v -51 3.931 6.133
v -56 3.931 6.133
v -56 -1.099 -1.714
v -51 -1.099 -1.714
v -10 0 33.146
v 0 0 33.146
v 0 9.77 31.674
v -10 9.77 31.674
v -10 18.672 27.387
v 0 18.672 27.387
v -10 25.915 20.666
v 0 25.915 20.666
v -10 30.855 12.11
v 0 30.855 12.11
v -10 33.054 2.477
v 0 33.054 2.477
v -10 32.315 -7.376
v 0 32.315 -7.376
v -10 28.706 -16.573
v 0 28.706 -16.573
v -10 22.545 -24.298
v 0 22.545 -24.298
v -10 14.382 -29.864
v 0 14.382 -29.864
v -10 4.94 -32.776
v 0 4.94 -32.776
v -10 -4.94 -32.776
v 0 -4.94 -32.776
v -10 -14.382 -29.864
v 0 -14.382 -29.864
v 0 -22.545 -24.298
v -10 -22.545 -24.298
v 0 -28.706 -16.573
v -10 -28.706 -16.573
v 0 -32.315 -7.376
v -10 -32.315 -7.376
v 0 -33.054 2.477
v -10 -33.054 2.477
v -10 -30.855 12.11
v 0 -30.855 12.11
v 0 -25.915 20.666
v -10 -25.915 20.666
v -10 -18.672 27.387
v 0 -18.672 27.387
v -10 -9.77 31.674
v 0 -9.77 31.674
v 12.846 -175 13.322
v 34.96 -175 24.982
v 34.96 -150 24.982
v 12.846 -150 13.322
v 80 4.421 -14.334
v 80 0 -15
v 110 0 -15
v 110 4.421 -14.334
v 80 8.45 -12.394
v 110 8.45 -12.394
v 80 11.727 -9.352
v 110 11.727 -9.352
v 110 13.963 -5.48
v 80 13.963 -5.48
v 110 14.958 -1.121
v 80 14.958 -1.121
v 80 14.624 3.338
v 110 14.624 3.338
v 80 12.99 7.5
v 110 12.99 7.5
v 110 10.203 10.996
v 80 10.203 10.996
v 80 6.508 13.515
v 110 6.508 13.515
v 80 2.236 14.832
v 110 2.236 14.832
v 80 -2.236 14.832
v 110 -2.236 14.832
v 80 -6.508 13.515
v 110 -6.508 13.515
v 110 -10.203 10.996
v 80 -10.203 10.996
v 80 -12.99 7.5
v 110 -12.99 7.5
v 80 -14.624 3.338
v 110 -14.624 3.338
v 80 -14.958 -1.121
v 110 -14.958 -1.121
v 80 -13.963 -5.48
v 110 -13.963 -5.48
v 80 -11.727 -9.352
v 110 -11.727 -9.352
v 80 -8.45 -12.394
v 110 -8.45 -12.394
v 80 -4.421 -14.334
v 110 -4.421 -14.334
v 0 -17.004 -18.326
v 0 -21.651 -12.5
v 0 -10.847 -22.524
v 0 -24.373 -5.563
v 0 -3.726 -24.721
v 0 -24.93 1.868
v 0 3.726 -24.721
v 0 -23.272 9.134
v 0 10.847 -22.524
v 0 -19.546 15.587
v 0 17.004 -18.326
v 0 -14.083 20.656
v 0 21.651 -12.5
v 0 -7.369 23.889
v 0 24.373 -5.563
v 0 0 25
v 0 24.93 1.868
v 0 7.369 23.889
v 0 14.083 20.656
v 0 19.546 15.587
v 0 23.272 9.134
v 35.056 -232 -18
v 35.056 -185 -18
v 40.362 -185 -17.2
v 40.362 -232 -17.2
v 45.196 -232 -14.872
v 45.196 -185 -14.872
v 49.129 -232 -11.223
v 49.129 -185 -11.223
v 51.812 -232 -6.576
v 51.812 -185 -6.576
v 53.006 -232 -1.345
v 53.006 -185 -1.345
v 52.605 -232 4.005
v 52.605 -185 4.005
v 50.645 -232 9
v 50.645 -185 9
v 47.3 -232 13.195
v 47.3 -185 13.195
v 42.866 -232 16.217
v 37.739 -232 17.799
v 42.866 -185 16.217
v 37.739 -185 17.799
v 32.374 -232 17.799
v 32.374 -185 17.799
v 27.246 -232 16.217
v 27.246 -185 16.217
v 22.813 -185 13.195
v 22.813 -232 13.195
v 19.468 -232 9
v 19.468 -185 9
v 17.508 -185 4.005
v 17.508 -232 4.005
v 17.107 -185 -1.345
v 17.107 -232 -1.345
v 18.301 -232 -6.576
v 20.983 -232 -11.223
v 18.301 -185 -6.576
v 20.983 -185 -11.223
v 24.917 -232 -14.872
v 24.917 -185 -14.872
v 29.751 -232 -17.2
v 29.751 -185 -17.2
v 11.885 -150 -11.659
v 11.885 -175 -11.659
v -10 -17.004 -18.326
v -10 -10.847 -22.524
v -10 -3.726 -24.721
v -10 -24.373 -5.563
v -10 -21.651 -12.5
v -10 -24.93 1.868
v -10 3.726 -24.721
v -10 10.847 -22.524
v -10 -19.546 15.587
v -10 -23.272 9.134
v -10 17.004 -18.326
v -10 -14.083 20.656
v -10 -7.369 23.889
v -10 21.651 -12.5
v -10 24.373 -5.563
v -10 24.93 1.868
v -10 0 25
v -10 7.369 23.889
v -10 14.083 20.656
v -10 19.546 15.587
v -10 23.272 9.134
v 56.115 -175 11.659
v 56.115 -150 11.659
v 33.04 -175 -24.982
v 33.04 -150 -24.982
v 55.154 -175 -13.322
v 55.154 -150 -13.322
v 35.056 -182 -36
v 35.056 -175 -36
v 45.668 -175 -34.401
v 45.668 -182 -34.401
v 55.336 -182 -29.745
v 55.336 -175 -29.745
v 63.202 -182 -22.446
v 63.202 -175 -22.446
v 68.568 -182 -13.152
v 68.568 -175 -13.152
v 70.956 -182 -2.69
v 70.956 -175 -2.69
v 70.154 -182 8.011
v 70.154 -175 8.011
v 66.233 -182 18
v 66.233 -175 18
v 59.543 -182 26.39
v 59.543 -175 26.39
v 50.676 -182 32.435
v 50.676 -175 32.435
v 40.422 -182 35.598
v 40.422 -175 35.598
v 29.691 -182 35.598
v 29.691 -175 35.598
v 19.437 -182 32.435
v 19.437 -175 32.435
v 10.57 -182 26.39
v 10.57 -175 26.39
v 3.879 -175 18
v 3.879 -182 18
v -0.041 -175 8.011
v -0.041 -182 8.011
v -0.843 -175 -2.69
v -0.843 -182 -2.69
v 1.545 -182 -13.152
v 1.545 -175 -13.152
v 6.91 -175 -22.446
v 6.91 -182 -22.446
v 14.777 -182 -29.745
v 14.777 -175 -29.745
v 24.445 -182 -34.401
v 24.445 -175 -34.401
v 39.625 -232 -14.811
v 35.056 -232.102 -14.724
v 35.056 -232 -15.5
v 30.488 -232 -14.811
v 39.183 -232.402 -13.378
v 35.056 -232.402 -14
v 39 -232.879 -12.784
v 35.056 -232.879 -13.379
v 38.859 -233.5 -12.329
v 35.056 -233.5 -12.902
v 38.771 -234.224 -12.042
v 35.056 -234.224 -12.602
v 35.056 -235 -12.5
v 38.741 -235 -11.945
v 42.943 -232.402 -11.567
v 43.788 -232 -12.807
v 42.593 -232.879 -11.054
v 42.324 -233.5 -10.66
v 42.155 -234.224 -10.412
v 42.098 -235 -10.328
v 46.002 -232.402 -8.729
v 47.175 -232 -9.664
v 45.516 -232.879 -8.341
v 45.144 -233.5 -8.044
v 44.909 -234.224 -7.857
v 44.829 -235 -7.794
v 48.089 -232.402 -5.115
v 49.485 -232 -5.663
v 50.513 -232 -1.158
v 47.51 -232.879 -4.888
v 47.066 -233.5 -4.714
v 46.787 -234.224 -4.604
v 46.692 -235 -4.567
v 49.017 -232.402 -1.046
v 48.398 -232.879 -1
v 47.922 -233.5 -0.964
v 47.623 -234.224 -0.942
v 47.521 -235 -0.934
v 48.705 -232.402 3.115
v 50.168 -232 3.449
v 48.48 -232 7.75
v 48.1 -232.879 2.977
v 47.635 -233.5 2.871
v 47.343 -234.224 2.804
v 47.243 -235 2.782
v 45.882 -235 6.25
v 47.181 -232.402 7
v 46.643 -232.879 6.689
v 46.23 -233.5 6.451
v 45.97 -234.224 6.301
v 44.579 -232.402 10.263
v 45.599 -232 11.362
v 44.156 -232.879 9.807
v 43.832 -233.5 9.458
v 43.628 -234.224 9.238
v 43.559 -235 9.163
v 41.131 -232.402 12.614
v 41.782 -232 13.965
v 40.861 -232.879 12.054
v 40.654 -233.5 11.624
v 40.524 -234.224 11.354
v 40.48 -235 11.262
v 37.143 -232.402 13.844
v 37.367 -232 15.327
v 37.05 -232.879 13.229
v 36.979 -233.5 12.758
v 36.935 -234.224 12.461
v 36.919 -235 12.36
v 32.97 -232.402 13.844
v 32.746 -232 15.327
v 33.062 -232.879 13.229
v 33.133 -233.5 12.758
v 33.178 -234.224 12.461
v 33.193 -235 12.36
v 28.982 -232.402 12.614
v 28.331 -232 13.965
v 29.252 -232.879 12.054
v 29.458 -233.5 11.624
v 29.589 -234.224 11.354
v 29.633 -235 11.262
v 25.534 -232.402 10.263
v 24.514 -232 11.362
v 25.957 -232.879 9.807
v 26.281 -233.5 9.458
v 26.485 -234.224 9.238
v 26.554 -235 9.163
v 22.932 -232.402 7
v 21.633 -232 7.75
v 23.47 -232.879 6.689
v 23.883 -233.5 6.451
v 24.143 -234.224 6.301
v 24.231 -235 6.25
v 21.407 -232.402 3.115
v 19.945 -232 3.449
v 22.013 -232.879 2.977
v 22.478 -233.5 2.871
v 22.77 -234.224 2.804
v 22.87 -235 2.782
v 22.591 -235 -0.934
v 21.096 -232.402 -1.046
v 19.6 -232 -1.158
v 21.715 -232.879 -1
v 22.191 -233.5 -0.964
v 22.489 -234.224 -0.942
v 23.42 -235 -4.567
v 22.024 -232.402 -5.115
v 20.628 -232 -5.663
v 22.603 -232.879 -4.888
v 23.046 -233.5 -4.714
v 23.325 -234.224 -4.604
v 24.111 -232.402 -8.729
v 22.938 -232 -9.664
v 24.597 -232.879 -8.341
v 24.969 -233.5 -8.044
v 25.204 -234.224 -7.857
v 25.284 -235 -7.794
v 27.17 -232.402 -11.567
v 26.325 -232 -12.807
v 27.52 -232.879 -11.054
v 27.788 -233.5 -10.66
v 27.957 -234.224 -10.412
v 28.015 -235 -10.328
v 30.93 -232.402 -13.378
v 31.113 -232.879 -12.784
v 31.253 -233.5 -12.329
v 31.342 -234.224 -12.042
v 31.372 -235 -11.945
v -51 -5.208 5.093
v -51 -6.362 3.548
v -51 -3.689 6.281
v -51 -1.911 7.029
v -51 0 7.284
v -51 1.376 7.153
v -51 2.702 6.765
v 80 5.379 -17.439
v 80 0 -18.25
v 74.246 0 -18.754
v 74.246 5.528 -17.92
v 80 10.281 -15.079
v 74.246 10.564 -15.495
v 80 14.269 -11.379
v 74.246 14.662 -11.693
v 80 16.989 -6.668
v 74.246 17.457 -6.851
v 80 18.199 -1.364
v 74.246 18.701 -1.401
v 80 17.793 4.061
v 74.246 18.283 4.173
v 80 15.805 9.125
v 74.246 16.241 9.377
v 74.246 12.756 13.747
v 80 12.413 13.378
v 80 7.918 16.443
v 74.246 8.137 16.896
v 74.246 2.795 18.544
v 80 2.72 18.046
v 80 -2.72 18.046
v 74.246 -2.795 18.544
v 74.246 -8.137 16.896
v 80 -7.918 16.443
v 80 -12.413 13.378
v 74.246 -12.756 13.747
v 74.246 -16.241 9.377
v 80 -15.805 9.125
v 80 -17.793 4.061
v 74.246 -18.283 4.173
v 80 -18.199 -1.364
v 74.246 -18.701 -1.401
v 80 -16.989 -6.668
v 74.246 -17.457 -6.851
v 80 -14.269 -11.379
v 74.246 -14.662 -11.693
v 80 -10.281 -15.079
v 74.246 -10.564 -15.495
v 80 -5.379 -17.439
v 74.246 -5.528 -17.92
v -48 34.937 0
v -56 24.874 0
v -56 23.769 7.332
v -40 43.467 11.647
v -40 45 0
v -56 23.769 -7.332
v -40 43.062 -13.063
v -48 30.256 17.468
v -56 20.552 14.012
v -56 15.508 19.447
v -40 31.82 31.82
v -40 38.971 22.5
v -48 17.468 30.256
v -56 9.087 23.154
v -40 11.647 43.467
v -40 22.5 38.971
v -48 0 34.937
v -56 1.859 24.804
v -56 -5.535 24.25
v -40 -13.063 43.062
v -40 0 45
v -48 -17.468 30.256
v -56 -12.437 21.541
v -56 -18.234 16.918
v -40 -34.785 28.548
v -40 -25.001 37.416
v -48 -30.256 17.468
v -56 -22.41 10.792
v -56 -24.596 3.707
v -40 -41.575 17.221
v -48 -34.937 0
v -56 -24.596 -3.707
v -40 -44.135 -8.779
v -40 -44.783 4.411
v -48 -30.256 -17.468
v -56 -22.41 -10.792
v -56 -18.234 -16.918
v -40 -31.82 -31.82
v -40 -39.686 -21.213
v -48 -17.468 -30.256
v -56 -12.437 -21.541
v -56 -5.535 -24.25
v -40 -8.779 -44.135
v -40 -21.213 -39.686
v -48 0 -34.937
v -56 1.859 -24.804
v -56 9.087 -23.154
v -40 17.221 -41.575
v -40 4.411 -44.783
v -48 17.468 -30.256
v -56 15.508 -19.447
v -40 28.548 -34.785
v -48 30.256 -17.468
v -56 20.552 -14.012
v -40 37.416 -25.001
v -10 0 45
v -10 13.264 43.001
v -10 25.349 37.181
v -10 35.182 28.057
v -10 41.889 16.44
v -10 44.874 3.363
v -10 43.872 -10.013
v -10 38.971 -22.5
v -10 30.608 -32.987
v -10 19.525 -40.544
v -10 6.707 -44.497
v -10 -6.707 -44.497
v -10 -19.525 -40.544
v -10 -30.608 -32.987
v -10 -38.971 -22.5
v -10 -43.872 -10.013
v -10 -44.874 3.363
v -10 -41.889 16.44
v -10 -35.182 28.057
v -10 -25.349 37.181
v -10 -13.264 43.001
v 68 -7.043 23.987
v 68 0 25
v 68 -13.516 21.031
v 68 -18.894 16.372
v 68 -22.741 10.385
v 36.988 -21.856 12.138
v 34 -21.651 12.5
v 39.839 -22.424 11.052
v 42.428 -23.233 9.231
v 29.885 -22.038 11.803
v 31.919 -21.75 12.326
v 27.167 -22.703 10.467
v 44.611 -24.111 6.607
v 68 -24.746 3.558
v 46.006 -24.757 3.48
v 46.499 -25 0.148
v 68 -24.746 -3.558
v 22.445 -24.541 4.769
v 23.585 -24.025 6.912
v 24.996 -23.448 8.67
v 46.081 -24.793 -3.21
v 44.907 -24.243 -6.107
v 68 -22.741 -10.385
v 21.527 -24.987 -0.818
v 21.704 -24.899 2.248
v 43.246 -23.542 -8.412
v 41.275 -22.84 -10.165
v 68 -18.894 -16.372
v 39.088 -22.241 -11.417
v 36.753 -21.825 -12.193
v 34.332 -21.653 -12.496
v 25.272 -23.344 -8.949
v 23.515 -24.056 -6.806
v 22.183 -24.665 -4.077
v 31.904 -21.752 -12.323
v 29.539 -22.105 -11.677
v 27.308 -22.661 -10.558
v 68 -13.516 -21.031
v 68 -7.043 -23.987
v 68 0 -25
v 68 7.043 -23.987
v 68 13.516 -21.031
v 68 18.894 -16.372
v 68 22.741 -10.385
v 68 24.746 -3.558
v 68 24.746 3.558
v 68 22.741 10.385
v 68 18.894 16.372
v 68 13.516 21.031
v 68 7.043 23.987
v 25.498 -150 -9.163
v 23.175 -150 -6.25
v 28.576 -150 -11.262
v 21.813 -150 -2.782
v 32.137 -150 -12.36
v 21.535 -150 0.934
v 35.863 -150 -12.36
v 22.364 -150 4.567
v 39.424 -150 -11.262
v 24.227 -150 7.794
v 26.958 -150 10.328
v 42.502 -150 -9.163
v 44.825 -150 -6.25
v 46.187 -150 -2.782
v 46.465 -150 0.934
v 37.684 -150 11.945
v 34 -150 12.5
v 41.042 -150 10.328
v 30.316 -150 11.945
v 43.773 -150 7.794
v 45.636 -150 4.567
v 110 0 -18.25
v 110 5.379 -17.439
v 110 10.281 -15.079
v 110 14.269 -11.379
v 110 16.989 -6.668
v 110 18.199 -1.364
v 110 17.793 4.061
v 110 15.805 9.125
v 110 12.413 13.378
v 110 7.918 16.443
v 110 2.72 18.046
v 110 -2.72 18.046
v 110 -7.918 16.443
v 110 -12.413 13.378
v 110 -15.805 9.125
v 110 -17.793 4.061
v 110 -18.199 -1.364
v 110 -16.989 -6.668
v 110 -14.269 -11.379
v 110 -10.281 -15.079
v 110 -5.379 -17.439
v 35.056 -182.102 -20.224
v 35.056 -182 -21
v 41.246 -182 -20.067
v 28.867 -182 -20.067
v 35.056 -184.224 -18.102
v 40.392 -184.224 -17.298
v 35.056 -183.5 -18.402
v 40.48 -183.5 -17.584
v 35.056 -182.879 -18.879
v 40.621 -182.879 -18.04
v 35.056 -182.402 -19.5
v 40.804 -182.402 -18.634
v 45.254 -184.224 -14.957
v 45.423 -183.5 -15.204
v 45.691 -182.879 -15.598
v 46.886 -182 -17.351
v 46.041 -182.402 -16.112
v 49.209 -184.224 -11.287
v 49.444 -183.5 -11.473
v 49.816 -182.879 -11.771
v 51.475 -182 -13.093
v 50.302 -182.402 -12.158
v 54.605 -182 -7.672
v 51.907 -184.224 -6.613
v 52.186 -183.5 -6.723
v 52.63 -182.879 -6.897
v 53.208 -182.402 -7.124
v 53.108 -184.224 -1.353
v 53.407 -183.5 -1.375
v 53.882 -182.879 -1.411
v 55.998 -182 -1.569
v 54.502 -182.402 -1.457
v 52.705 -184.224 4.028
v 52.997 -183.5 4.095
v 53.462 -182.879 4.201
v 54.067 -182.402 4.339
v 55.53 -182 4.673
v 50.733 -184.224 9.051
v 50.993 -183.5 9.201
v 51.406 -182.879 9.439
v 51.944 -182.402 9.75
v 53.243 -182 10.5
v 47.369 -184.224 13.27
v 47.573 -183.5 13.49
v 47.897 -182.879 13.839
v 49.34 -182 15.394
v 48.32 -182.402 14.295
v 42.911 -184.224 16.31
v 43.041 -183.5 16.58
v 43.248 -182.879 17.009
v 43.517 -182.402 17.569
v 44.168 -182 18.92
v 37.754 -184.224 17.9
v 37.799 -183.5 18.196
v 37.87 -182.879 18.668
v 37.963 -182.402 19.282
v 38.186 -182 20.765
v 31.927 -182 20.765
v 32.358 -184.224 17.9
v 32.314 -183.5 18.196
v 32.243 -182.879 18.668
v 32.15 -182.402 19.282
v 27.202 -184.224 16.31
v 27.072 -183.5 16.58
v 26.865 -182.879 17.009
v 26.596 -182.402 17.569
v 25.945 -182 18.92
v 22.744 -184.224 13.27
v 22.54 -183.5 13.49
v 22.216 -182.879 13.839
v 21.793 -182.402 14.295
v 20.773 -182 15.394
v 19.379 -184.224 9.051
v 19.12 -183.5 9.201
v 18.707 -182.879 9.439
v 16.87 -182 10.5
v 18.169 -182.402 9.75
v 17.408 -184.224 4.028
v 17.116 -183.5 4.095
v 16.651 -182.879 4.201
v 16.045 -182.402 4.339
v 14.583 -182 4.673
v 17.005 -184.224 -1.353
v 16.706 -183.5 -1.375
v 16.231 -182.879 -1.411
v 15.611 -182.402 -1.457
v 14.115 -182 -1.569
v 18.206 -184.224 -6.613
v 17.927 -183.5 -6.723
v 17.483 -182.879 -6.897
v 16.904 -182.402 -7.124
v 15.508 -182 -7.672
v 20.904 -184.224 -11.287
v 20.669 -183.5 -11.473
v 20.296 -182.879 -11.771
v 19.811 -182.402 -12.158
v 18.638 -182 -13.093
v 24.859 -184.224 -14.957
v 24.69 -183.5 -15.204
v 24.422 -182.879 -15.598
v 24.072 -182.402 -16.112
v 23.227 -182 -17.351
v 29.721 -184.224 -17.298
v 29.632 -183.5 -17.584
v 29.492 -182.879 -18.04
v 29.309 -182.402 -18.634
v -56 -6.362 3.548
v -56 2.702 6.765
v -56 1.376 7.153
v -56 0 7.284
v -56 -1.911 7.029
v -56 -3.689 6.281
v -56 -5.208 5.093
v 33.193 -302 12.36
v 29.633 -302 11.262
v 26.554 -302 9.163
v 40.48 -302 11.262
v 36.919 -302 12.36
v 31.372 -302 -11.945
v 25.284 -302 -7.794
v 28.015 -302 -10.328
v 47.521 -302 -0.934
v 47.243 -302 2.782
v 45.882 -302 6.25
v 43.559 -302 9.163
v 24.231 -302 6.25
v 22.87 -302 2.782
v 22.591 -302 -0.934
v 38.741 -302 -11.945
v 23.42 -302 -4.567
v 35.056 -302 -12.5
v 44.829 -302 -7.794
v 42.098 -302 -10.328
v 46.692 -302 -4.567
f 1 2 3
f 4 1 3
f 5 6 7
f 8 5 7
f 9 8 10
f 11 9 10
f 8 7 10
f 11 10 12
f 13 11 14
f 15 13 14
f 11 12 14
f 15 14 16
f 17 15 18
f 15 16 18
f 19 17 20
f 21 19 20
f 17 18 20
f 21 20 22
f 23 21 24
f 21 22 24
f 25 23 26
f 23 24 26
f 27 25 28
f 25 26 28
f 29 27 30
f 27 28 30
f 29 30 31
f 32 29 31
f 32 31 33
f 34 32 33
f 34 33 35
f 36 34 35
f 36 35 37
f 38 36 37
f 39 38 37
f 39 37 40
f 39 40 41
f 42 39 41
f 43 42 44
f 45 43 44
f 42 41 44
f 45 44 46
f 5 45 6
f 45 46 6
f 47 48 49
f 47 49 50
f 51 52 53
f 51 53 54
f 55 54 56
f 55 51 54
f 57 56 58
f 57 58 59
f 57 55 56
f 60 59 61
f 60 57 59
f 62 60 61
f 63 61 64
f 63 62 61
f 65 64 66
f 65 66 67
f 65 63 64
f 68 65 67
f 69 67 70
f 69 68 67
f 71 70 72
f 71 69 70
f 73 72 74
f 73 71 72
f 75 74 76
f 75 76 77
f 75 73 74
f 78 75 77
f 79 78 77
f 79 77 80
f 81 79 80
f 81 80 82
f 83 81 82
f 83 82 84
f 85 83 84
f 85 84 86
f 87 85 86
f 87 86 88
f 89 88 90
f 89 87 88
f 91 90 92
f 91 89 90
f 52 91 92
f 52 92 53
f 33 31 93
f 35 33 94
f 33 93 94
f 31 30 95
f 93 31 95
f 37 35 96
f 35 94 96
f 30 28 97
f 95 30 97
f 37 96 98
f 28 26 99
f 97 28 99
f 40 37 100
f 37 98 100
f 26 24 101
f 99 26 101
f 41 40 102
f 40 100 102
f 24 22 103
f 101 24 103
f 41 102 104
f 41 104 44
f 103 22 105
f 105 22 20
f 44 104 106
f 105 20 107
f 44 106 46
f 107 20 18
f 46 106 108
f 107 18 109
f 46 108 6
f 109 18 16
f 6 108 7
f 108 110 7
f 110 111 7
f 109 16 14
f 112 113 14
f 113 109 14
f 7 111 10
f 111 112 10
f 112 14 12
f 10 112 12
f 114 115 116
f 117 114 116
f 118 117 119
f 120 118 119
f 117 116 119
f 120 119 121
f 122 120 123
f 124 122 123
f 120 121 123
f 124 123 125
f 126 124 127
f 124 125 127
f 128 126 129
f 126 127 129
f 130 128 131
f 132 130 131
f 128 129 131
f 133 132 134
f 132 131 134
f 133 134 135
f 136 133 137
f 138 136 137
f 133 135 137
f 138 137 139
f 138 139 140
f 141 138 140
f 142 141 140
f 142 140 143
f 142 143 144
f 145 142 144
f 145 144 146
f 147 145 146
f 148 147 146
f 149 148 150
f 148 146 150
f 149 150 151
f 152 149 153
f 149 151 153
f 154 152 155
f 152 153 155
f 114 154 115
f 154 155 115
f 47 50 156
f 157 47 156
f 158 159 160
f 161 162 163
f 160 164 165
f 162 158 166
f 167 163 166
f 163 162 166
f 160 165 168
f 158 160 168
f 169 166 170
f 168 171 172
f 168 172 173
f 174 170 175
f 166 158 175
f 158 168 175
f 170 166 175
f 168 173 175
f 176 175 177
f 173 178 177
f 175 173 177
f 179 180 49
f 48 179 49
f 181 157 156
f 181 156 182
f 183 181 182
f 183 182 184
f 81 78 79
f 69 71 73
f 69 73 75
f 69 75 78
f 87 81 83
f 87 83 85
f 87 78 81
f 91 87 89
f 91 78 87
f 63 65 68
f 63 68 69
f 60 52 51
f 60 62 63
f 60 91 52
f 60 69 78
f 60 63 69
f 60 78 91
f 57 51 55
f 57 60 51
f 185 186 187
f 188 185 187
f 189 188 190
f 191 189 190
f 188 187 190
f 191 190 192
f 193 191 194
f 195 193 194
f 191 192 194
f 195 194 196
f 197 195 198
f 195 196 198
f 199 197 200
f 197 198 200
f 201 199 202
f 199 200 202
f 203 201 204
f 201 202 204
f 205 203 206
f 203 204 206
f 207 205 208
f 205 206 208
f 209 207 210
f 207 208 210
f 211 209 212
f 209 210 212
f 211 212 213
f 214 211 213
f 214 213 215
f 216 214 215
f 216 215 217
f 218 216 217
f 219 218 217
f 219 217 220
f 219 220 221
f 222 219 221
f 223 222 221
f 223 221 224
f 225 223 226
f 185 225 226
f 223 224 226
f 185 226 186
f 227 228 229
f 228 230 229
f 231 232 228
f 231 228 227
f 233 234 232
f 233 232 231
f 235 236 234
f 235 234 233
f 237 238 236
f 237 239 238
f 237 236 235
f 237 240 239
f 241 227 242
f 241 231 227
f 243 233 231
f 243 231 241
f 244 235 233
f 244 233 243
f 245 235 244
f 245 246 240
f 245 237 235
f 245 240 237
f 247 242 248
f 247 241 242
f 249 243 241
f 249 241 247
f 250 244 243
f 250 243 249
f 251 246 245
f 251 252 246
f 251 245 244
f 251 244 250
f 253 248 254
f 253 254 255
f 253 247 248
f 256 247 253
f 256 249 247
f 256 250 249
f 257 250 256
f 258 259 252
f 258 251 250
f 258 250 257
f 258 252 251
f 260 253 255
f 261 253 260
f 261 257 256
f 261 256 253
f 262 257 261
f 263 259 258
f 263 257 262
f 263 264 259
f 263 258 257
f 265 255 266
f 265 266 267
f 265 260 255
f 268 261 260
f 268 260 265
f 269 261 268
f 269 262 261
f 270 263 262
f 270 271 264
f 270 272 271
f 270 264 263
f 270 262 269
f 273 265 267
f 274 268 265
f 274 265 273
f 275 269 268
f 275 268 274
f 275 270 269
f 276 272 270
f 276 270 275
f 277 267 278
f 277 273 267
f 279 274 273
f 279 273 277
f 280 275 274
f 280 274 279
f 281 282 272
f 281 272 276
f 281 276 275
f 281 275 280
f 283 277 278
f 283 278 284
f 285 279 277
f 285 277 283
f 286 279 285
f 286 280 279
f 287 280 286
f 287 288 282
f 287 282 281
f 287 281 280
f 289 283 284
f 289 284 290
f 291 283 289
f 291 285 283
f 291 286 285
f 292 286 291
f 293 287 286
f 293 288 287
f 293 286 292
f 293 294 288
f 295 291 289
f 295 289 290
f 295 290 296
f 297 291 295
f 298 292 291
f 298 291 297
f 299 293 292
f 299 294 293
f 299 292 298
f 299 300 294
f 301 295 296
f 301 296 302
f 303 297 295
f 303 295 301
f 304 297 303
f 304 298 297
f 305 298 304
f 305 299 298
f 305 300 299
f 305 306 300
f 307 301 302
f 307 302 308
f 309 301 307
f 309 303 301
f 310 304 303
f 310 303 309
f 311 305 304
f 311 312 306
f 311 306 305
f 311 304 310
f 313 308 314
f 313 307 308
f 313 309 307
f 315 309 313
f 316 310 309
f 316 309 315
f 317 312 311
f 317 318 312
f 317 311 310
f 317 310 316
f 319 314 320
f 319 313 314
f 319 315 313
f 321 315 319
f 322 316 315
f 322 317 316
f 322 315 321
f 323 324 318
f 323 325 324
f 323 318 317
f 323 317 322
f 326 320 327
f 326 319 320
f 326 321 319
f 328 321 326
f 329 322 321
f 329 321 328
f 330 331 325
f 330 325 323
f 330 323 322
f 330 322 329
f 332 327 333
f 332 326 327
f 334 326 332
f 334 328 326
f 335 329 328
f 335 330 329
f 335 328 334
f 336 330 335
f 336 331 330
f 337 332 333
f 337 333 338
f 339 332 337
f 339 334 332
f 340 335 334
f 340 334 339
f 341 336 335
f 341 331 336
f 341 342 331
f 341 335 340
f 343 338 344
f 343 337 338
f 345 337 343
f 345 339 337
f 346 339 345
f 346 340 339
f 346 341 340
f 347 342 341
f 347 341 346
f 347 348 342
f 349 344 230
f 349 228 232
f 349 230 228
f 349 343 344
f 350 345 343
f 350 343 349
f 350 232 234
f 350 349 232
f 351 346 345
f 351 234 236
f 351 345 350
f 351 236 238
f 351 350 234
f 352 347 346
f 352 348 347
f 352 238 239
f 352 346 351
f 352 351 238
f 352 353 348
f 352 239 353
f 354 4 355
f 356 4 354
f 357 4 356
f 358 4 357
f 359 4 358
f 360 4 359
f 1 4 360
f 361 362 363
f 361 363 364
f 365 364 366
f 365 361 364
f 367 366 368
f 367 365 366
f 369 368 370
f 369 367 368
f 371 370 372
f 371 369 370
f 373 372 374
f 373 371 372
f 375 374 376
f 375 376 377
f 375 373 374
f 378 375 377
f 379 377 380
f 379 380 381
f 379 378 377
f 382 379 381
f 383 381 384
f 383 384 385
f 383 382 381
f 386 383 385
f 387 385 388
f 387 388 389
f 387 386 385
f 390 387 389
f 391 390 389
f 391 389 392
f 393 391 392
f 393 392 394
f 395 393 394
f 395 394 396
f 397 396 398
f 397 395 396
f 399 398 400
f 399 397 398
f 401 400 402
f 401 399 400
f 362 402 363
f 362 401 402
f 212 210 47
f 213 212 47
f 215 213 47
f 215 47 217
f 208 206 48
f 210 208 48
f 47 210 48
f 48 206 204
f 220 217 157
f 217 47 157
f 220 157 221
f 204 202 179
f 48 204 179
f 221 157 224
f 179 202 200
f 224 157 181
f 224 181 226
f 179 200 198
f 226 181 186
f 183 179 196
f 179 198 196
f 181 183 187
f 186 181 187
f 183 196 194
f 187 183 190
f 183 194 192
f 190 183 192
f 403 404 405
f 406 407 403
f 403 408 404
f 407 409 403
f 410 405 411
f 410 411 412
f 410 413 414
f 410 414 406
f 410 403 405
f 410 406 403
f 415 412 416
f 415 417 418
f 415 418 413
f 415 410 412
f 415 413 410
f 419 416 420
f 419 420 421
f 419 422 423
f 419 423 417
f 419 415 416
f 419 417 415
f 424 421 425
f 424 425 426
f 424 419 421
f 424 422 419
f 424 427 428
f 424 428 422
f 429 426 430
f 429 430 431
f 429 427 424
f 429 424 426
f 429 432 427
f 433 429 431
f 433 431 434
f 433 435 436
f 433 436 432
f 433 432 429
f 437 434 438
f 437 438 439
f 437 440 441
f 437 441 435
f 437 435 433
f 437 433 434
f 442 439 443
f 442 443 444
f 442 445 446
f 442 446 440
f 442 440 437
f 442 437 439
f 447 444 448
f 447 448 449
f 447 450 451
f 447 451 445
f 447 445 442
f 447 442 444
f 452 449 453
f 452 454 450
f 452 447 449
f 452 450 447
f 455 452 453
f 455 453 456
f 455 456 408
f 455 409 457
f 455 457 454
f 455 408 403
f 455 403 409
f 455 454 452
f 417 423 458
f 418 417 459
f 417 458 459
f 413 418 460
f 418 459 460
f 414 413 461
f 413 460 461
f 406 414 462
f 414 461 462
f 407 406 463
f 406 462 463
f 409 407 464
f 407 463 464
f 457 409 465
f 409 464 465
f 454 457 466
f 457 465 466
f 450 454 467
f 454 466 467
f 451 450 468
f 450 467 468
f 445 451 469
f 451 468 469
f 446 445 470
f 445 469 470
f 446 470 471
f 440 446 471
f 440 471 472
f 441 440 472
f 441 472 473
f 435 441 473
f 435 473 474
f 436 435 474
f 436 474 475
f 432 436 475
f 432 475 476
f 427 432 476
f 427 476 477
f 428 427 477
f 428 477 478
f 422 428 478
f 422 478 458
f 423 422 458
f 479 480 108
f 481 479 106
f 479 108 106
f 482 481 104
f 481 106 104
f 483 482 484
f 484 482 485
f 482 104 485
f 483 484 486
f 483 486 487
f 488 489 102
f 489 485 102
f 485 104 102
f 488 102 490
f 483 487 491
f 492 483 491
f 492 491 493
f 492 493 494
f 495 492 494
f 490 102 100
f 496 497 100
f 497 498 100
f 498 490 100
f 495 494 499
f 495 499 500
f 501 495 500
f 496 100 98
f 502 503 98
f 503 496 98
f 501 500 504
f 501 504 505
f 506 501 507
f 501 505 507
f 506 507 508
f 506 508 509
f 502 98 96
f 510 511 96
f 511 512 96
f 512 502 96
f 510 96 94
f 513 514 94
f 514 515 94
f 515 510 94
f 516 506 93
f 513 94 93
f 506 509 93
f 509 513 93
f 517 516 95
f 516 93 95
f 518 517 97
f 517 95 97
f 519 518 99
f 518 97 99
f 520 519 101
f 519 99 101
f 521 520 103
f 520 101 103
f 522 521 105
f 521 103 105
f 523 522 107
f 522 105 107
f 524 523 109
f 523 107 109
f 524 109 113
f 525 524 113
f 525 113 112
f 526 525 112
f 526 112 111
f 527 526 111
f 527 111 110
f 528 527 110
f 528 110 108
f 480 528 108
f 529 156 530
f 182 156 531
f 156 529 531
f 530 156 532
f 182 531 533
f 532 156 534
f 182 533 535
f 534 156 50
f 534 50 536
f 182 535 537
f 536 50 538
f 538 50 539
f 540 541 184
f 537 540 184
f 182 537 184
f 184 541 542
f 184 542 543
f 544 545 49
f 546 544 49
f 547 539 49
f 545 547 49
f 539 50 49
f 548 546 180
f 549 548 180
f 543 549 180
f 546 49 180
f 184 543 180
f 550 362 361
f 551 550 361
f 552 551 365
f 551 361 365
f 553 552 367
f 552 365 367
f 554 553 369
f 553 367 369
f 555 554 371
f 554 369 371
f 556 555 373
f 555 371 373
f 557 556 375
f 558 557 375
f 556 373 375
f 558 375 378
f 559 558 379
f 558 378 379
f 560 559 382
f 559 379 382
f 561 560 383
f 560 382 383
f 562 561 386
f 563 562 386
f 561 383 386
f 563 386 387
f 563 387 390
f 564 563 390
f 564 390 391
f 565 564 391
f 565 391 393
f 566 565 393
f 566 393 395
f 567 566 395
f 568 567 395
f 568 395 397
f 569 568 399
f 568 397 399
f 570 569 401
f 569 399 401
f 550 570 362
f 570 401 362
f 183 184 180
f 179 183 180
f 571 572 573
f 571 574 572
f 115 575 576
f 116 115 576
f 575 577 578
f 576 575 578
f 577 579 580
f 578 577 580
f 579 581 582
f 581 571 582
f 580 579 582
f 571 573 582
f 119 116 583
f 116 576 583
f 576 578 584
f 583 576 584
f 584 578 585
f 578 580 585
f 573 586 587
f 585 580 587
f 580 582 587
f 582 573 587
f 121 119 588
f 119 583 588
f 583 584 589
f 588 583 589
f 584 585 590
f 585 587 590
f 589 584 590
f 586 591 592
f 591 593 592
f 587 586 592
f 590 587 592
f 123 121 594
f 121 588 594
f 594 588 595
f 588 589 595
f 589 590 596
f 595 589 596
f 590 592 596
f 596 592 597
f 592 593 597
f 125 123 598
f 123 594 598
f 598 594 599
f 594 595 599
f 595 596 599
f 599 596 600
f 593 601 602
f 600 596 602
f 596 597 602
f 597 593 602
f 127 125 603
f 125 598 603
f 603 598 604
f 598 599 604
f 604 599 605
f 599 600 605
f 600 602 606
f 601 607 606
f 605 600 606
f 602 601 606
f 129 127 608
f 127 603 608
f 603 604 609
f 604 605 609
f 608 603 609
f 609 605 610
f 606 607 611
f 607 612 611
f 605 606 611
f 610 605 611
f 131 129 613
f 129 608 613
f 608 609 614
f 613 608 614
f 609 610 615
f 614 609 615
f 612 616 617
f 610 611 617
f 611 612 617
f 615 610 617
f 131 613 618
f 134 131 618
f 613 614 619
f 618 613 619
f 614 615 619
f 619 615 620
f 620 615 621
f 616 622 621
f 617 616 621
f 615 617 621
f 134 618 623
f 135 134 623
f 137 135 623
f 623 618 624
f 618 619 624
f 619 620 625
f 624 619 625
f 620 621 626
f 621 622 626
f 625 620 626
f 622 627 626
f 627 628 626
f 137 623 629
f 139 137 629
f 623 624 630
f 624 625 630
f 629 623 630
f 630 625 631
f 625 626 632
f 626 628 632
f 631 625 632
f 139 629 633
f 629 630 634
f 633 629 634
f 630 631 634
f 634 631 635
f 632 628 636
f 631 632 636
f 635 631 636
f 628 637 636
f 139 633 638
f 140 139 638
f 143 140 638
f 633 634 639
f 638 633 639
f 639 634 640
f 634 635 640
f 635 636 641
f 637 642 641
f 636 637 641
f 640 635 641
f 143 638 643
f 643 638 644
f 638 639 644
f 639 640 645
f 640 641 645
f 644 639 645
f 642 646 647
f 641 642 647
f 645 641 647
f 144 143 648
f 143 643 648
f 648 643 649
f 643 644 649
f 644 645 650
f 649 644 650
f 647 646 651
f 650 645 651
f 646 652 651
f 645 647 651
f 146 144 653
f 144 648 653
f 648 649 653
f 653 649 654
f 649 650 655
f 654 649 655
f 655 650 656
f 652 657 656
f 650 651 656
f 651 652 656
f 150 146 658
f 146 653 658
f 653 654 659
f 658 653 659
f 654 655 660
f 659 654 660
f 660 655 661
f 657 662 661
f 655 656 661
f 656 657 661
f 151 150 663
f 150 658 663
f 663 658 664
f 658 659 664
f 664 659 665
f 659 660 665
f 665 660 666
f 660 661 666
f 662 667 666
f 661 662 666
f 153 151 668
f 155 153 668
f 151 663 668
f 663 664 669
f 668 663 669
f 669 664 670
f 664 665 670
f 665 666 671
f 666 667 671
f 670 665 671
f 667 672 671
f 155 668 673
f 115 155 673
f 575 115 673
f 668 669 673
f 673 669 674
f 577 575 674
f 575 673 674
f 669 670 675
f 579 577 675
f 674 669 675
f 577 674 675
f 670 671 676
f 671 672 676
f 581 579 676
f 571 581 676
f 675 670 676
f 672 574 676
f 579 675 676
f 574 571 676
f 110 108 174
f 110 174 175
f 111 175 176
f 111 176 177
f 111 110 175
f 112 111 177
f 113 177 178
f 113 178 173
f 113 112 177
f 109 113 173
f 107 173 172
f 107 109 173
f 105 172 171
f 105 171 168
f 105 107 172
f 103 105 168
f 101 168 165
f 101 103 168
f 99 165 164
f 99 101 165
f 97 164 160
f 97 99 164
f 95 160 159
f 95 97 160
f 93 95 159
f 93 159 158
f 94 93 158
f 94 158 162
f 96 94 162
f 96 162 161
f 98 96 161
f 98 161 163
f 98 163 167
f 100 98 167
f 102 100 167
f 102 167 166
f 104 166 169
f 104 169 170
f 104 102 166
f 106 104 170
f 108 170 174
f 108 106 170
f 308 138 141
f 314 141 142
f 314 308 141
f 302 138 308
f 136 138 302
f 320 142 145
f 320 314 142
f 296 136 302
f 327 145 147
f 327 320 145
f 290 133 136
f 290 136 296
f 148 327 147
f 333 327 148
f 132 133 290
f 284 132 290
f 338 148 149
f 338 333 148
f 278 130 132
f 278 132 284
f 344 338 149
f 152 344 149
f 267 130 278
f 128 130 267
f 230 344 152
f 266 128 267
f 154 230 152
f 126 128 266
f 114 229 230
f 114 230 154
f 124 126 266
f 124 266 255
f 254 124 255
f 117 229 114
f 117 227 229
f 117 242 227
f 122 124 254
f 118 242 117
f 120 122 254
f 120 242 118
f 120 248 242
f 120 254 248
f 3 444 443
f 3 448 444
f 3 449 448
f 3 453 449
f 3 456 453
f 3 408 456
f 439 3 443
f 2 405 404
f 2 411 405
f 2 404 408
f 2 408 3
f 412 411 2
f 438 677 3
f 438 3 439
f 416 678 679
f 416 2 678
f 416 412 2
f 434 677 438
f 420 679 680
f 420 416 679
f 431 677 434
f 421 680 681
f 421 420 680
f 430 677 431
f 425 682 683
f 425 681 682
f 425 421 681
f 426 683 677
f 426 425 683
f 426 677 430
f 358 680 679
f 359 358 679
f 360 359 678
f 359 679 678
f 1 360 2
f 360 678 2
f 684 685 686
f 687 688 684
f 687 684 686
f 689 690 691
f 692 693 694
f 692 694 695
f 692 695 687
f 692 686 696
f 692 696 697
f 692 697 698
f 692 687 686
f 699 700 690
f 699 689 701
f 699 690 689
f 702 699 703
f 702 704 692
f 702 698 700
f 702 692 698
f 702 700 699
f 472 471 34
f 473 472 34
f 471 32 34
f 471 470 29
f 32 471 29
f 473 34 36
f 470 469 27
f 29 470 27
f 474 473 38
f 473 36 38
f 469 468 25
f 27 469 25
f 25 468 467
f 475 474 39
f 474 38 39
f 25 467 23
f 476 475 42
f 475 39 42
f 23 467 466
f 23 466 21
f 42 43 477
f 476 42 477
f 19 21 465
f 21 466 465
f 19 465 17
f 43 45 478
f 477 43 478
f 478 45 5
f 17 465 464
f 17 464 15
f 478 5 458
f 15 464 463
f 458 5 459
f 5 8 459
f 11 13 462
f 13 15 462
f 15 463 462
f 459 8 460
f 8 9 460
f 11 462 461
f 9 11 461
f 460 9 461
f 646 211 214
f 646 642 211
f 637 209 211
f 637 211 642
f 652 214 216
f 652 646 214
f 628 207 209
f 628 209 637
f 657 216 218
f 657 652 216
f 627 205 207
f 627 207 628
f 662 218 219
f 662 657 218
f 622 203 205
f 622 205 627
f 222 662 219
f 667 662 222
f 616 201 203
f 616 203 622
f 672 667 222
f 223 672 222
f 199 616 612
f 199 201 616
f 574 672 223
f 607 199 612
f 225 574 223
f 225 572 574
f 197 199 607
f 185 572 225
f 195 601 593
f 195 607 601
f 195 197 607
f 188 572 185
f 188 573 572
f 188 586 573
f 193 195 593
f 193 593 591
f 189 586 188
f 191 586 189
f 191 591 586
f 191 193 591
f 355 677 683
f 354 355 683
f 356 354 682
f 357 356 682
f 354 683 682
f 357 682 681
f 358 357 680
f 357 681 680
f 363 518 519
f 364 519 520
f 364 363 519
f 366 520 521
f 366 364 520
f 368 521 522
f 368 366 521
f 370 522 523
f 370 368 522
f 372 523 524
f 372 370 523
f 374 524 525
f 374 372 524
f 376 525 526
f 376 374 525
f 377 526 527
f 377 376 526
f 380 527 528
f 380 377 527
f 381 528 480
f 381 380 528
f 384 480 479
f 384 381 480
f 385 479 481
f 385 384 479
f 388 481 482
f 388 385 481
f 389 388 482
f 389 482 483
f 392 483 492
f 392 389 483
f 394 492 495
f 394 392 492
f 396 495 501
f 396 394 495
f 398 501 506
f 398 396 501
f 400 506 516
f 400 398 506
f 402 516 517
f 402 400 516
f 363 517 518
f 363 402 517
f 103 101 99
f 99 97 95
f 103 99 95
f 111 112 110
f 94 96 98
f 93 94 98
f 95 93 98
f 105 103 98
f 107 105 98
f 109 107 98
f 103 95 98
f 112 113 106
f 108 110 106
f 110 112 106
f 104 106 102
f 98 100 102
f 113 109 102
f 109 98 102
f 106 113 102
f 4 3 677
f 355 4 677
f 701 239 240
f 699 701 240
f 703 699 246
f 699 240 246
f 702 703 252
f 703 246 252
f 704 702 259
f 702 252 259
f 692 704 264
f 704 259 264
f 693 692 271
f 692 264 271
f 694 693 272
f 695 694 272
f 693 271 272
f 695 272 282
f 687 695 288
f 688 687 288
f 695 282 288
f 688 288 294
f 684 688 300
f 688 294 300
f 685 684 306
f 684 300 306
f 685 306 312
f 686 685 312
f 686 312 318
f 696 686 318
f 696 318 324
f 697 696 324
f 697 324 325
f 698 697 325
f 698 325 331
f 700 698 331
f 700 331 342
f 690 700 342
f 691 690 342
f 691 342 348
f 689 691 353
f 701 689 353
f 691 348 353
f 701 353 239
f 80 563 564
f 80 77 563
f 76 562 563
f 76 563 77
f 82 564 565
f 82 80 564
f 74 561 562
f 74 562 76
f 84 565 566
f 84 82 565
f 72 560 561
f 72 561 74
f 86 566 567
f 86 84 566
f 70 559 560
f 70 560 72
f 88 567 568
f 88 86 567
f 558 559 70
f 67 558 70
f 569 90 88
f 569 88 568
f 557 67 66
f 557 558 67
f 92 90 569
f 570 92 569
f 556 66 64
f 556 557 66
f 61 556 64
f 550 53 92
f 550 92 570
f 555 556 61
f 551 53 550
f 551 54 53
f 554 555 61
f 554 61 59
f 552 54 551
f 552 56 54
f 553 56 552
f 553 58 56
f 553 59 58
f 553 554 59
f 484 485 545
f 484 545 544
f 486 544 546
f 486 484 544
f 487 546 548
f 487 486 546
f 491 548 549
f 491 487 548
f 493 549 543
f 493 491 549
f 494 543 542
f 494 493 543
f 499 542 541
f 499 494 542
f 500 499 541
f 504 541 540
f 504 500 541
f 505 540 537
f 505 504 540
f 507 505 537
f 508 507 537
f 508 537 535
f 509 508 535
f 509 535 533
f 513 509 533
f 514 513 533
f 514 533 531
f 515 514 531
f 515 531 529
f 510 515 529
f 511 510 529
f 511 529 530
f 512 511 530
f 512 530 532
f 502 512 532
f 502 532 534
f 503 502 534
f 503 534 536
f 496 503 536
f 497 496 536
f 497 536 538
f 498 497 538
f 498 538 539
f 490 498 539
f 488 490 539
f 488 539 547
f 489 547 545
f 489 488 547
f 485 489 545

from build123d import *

# Parameters (mm, degrees)
SKETCH1_R            = 25
BOSS_EXTRUDE1_DEPTH  = 60
SKETCH2_R            = 20
BOSS_EXTRUDE3_DEPTH  = 20
BOSS_EXTRUDE3_TAPER  = 5
CHAMFER1_SIZE        = 13
CHAMFER1_SIZE_2      = 14.300817279
SKETCH3_R            = 18.250226729
SKETCH3_R_2          = 15
BOSS_EXTRUDE5_DEPTH  = 30
SKETCH4_R            = 12.5
BOSS_EXTRUDE6_DEPTH  = 150
SKETCH7_R            = 33.146308187
SKETCH7_R_2          = 25
BOSS_EXTRUDE11_DEPTH = 10
SKETCH8_R            = 45
BOSS_EXTRUDE12_DEPTH = 30
CUT_EXTRUDE1_DEPTH   = 5
BOSS_EXTRUDE13_DEPTH = 25
SKETCH14_R           = 36
BOSS_EXTRUDE14_DEPTH = 7
SKETCH15_R           = 18
BOSS_EXTRUDE15_DEPTH = 50
SKETCH16_R           = 12.5
BOSS_EXTRUDE16_DEPTH = 70
FILLET1_R            = 3
FILLET2_R            = 3


# Read off the part's stored shape, not the designer's step: Boundary1
with BuildPart() as part:
    # Sketch1 → Boss-Extrude1 (new body)
    with BuildSketch(Plane(origin=(0, 0, 0), x_dir=(0, 0, -1), z_dir=(1, 0, 0))):
        with Locations(Location((0, 0, 0), (0, 0, 180))):
            Circle(SKETCH1_R)
    extrude(amount=BOSS_EXTRUDE1_DEPTH)

    # Sketch2 → Boss-Extrude3 (add)
    with BuildSketch(Plane(origin=(60, 0, 0), x_dir=(0, 0, -1), z_dir=(1, 0, 0))):
        Circle(SKETCH2_R)
    extrude(amount=BOSS_EXTRUDE3_DEPTH, taper=BOSS_EXTRUDE3_TAPER)

    # Chamfer1
    # the kernel refuses this chamfer: 14.300817279, 13 mm, written as the material it adds along each edge
    with BuildSketch(Plane(origin=(60, 0, 0), x_dir=(0, 0, -1), z_dir=(0, -1, 0))) as chamfer1_piece_1_section:
        Polygon((20 + CHAMFER1_SIZE, 0), (20 - CHAMFER1_SIZE_2 * 0.0871557427485, CHAMFER1_SIZE_2 * 0.996194698102), (20, 0), align=None)
    chamfer1_piece_1 = revolve(axis=Axis((60, 0, 0), (1, 0, 0)), mode=Mode.PRIVATE)
    chamfer1_piece_1 = chamfer1_piece_1 & Plane(origin=(71.177617688, 0, 0), x_dir=(0, 0, 1), z_dir=(-1, 0, 0)) * Cylinder(25, 132, mode=Mode.PRIVATE)
    add(chamfer1_piece_1)

    # Sketch3 → Boss-Extrude5 (add)
    with BuildSketch(Plane(origin=(80, 0, 0), x_dir=(0, 0, -1), z_dir=(1, 0, 0))):
        Circle(SKETCH3_R)
        Circle(SKETCH3_R_2, mode=Mode.SUBTRACT)
    extrude(amount=BOSS_EXTRUDE5_DEPTH)

    # Sketch4 → Boss-Extrude6 (add)
    with BuildSketch(Plane(origin=(0, 0, 0), x_dir=(1, 0, 0), z_dir=(0, 1, 0))):
        with Locations(Location((34, 0, 0), (0, 0, 270))):
            Circle(SKETCH4_R)
    extrude(amount=-BOSS_EXTRUDE6_DEPTH)

    # Sketch13 → Boss-Extrude13 (add)
    with BuildSketch(Plane.XZ.offset(150)):
        Polygon((33.039636823, -24.981547241), (55.154472948, -13.322472529), (56.114836125, 11.659074712), (34.960363177, 24.981547241), (12.845527052, 13.322472529), (11.885163875, -11.659074712), align=None)
    extrude(amount=BOSS_EXTRUDE13_DEPTH)

    # Sketch14 → Boss-Extrude14 (add)
    with BuildSketch(Plane.XZ.offset(175)):
        with Locations(Location((35.056399495, 0, 0), (0, 0, 270))):
            Circle(SKETCH14_R)
    extrude(amount=BOSS_EXTRUDE14_DEPTH)

    # Sketch15 → Boss-Extrude15 (add)
    with BuildSketch(Plane.XZ.offset(182)):
        with Locations(Location((35.056399495, 0, 0), (0, 0, 270))):
            Circle(SKETCH15_R)
    extrude(amount=BOSS_EXTRUDE15_DEPTH)

    # Sketch16 → Boss-Extrude16 (add)
    with BuildSketch(Plane.XZ.offset(232)):
        with Locations(Location((35.056399495, 0, 0), (0, 0, 270))):
            Circle(SKETCH16_R)
    extrude(amount=BOSS_EXTRUDE16_DEPTH)

    # Fillet1
    fillet1_edges = [part.edges().sort_by_distance(p)[0] for p in [
        (35.056399495, -232, 12.5),
    ]]
    fillet(fillet1_edges, radius=FILLET1_R)

    # Fillet2
    fillet2_edges = [part.edges().sort_by_distance(p)[0] for p in [
        (35.056399495, -182, 18),
    ]]
    fillet(fillet2_edges, radius=FILLET2_R)


with BuildPart() as body_2:
    # Sketch7 → Boss-Extrude11 (new body)
    with BuildSketch(Plane.ZY):
        Circle(SKETCH7_R)
        Circle(SKETCH7_R_2, mode=Mode.SUBTRACT)
    extrude(amount=BOSS_EXTRUDE11_DEPTH)

    # Sketch8 → Boss-Extrude12 (add)
    with BuildSketch(Plane.ZY.offset(10)):
        Circle(SKETCH8_R)
    extrude(amount=BOSS_EXTRUDE12_DEPTH)

    # Boundary1 outline → Boundary1 (revolve)
    with BuildSketch(Plane.YX):
        Polygon((0, -56), (24.873571566, -56), (45, -40), (0, -40), align=None)
    revolve(axis=Axis((0, 0, 0), (1, 0, 0)))

    # Sketch11 → Cut-Extrude1 (cut)
    with BuildSketch(Plane.ZY.offset(56)):
        with BuildLine():
            Line((6.132563907, 3.930969814), (-1.714402502, -1.098930983))
            Line((-1.714402502, -1.098930983), (3.548302536, -6.361636021))
            ThreePointArc((3.548302536, -6.361636021), (6.281230942, -3.68876695), (7.28428883, 0))
            ThreePointArc((7.28428883, 0), (6.990430263, 2.048108516), (6.132563907, 3.930969814))
        make_face()
    extrude(amount=-CUT_EXTRUDE1_DEPTH, mode=Mode.SUBTRACT)


solid = Compound([part.part, body_2.part])
